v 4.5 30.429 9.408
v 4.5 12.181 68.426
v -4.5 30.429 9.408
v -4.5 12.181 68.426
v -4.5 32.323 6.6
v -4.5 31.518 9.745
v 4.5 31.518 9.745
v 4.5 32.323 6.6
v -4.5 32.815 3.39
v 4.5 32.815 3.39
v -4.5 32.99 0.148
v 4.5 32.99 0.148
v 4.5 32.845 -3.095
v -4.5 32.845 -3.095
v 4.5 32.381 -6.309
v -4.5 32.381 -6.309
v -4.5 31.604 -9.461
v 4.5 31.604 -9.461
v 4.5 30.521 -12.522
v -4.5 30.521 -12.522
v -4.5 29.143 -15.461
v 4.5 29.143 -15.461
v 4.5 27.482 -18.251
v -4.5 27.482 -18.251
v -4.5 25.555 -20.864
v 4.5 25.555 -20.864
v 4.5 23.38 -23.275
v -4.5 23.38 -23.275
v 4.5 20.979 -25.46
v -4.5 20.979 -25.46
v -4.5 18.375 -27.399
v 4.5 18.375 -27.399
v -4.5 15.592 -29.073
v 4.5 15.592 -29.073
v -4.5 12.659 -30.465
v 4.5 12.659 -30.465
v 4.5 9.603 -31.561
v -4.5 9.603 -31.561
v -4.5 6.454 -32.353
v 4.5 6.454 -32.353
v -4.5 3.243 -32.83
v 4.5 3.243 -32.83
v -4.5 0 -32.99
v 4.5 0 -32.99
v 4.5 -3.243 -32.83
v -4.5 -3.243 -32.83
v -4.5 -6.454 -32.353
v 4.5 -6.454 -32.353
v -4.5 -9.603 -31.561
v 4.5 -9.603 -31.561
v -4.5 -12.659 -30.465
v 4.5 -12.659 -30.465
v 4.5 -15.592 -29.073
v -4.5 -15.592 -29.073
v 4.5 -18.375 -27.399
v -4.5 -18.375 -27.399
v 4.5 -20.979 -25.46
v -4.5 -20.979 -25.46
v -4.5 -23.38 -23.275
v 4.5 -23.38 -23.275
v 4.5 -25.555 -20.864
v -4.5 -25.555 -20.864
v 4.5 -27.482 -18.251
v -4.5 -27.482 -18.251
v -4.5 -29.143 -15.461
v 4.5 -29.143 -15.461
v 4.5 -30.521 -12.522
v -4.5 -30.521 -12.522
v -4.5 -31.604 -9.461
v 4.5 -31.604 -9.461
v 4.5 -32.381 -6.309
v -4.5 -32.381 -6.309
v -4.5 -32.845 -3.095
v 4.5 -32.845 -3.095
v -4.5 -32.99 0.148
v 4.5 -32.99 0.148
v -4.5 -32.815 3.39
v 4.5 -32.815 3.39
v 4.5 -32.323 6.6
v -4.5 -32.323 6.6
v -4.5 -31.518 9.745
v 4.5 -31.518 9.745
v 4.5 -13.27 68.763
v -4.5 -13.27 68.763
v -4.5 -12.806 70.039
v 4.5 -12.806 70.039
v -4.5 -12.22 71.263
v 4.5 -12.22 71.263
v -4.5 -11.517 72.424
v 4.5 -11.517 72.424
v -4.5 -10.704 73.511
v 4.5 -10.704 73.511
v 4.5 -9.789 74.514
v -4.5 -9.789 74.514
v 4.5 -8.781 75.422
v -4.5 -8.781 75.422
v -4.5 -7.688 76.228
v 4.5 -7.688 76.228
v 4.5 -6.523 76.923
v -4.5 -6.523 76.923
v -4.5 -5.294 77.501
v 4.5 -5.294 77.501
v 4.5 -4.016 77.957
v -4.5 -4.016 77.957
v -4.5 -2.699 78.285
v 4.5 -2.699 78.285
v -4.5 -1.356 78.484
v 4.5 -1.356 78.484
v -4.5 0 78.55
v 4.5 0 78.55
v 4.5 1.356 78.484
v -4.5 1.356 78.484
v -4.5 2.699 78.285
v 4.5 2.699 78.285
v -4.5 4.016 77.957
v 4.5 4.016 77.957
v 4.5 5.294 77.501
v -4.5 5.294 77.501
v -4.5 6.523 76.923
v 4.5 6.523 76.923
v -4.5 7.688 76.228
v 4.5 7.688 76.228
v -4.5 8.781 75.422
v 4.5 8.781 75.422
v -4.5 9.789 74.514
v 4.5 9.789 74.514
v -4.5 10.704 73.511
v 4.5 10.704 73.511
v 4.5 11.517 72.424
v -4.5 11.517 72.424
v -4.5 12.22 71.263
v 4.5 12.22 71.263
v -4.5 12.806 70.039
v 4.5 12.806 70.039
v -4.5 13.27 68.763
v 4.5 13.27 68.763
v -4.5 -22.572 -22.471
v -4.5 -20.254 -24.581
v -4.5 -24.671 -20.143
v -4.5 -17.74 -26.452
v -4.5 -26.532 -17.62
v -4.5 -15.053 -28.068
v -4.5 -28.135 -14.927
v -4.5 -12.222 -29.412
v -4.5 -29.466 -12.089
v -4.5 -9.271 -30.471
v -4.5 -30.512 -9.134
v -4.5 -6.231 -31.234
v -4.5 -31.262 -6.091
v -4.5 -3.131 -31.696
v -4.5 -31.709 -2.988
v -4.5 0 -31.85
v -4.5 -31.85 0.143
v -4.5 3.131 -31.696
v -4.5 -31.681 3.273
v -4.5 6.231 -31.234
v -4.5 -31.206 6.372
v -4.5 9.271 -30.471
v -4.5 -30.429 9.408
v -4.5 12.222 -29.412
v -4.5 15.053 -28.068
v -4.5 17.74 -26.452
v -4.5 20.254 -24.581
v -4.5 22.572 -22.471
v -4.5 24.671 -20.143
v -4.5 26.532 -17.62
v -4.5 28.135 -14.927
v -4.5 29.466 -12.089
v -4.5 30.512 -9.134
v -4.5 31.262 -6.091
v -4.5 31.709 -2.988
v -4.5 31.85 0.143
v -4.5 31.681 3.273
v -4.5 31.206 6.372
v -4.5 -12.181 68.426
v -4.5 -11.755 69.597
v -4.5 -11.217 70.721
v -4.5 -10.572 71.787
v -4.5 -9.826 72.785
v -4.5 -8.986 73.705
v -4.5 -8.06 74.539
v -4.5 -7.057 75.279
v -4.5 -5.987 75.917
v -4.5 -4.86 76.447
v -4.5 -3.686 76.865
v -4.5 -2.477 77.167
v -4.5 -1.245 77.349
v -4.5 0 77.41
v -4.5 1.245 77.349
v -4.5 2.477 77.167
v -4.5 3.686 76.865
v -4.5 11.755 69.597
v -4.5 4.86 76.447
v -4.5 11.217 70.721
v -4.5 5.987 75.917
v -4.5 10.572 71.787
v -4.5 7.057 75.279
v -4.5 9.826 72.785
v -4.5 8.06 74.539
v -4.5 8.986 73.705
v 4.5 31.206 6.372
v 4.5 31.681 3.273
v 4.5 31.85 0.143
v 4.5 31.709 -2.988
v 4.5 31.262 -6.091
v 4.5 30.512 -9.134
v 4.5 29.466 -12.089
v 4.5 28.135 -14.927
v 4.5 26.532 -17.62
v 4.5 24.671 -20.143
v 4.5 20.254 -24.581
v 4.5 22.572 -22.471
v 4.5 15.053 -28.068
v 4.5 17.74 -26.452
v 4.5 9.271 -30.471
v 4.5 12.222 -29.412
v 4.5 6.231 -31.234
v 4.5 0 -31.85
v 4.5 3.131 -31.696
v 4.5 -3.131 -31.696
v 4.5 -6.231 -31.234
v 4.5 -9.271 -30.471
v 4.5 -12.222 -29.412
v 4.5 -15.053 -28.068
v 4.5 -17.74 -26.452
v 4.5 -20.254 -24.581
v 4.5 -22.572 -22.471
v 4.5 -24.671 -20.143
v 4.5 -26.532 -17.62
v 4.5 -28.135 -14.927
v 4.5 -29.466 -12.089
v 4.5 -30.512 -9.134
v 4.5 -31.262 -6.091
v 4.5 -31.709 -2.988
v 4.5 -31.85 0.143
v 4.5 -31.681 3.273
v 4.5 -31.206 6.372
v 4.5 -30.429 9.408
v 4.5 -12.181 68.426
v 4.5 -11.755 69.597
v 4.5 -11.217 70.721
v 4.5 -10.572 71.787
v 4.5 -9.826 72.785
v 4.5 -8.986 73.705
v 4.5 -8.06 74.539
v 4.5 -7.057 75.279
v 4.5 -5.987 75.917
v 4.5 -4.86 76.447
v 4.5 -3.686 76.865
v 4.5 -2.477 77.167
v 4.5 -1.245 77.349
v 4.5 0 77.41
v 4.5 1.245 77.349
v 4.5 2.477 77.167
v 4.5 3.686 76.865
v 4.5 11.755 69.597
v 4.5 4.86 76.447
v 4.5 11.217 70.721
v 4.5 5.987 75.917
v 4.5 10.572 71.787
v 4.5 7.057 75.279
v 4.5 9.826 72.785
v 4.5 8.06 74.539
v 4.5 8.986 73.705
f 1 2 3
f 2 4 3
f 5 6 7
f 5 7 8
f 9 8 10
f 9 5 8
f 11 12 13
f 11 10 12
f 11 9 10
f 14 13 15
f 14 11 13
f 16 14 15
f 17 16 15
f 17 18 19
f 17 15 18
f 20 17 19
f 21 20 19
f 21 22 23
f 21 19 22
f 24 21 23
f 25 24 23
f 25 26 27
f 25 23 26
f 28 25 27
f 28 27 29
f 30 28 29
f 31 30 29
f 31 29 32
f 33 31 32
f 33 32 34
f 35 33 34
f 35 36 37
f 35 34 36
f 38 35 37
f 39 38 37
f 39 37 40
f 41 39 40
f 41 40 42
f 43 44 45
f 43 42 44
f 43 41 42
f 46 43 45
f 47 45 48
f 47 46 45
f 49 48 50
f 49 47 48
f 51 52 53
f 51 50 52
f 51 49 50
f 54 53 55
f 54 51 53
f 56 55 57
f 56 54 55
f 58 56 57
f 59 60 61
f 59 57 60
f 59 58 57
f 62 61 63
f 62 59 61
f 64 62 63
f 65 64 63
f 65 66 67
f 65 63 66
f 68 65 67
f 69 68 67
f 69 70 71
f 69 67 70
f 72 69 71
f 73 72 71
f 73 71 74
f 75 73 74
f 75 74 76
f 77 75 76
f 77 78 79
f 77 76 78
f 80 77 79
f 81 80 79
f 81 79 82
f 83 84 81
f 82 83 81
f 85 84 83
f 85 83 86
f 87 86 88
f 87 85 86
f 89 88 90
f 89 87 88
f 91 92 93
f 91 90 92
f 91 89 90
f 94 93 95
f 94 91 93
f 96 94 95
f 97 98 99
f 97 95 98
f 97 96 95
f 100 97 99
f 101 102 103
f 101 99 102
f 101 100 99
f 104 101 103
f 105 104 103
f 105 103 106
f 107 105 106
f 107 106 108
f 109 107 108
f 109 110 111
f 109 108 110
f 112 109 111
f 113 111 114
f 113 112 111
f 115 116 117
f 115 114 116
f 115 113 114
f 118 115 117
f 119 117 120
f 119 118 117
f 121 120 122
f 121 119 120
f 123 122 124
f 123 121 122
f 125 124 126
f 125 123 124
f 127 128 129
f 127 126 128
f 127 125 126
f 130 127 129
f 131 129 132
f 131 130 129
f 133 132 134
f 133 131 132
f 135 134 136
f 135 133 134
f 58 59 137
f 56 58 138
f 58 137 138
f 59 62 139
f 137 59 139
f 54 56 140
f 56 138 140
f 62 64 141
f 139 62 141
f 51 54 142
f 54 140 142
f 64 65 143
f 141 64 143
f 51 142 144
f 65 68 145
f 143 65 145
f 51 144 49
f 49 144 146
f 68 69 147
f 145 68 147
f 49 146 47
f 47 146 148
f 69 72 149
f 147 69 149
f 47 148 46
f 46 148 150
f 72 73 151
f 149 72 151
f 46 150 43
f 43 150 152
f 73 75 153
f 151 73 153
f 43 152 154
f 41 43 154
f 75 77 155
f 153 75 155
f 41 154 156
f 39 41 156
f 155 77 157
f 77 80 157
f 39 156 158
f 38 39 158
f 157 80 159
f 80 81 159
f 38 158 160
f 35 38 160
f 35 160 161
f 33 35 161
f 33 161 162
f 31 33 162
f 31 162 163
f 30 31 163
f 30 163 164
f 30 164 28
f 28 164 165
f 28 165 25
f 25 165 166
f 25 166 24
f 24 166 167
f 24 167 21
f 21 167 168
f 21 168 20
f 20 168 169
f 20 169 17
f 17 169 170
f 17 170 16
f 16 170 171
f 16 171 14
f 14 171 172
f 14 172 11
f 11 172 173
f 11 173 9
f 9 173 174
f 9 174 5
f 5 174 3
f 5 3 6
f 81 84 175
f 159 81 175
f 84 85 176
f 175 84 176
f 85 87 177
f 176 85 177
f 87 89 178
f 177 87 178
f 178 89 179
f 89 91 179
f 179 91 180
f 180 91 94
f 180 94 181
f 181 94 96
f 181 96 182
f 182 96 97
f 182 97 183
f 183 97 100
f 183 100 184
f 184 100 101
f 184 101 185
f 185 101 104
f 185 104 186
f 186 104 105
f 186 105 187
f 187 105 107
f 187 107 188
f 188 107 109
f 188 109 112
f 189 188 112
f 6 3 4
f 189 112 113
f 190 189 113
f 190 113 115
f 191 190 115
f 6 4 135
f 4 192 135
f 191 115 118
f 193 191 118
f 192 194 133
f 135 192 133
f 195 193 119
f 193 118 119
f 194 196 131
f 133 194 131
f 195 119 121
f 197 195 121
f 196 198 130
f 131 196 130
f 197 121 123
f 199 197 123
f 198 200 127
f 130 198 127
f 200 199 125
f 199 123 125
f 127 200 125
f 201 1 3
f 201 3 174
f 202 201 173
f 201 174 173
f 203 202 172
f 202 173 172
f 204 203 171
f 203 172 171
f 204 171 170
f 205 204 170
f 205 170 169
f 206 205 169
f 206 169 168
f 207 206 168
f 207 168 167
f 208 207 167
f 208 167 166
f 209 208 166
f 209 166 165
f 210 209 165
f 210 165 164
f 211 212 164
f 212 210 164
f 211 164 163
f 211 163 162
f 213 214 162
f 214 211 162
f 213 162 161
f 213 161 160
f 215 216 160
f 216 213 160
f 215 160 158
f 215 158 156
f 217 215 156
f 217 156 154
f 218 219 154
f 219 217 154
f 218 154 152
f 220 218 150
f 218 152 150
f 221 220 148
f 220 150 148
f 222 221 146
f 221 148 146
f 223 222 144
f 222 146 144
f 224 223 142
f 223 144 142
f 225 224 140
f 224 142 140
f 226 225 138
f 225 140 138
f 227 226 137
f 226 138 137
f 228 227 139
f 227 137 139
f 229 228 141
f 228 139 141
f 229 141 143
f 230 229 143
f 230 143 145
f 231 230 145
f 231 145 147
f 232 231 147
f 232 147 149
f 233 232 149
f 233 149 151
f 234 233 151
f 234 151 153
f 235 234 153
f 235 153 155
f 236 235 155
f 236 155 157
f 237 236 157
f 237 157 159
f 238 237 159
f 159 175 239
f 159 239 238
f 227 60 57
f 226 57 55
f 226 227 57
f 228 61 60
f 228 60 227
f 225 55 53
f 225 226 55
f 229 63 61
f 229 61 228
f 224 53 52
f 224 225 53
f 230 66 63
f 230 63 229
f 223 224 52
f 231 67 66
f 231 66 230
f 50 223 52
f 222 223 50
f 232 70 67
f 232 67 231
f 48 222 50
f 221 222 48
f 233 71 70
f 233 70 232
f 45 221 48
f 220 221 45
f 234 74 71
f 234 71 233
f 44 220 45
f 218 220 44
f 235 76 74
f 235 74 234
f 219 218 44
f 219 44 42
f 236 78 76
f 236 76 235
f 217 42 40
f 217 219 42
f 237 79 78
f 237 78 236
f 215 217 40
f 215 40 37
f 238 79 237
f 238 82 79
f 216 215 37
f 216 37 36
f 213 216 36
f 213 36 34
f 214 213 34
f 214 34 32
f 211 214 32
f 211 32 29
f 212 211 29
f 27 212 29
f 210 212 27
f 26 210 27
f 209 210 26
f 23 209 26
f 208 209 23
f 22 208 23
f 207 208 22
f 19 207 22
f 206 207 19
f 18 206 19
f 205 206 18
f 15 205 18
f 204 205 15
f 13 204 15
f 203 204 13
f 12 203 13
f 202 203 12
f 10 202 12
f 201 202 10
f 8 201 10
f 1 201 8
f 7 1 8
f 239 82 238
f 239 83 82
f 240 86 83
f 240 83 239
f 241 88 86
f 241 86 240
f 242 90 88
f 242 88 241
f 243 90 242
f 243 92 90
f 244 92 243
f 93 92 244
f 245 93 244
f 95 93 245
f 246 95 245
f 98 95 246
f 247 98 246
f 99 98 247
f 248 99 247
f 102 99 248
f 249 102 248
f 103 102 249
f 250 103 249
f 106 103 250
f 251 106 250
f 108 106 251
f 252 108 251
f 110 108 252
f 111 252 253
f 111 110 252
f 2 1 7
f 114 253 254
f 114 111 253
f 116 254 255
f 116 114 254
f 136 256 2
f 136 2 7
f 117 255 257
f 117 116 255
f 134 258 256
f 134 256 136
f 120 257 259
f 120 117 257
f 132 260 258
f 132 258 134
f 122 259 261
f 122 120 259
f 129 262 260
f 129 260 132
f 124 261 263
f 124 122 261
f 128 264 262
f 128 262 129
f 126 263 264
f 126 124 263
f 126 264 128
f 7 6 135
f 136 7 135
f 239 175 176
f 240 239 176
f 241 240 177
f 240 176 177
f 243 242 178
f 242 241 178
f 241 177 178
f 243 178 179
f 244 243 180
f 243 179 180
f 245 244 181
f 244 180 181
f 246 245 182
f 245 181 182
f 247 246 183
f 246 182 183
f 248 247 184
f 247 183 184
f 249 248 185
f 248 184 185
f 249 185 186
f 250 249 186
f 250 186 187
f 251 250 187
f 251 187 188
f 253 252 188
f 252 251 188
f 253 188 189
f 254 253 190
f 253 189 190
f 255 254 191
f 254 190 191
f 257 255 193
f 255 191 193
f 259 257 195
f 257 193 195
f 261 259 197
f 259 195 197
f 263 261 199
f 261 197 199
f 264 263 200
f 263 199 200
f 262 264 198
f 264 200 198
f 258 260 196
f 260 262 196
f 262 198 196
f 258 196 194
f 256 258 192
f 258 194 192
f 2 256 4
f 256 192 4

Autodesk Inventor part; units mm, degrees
ref_plane "YZ Plane" through (0, 0, 0) normal (1, 0, 0) x (0, 1, 0)
ref_plane "XZ Plane" through (0, 0, 0) normal (0, 1, 0) x (-1, 0, 0)
ref_plane "XY Plane" through (0, 0, 0) normal (0, 0, 1) x (1, 0, 0)
sketch "Sketch2" plane through (0, 0, 0) normal (1, 0, 0) x (0, 1, 0)
  circle A0 centre (0, 0) radius 31.85 construction
  circle A1 centre (0, 64.66) radius 12.75 construction
  line L0 (12.181, 68.4262) -> (30.4287, 9.4082)
  line L1 (-12.181, 68.4262) -> (-30.4287, 9.4082)
  arc A2 (12.181, 68.4262) -> (-12.181, 68.4262) centre (0, 64.66) ccw
  arc A3 (-30.4287, 9.4082) -> (30.4287, 9.4082) centre (0, 0) ccw
  line L2 (31.5179, 9.745) -> (13.2702, 68.763)
  arc A4 (13.2702, 68.763) -> (-13.2702, 68.763) centre (0, 64.66) ccw
  line L3 (-13.2702, 68.763) -> (-31.5179, 9.745)
  arc A5 (-31.5179, 9.745) -> (31.5179, 9.745) centre (0, 0) ccw
  dimension "d0" = 63.7
  dimension "d1" = 25.5
  dimension "d2" = 64.66
  dimension "d3" = 1.14
extrude "Extrusion1" add sketch "Sketch2" along normal mid plane 9
properties part number "TimingBlet" material "Rubber"
